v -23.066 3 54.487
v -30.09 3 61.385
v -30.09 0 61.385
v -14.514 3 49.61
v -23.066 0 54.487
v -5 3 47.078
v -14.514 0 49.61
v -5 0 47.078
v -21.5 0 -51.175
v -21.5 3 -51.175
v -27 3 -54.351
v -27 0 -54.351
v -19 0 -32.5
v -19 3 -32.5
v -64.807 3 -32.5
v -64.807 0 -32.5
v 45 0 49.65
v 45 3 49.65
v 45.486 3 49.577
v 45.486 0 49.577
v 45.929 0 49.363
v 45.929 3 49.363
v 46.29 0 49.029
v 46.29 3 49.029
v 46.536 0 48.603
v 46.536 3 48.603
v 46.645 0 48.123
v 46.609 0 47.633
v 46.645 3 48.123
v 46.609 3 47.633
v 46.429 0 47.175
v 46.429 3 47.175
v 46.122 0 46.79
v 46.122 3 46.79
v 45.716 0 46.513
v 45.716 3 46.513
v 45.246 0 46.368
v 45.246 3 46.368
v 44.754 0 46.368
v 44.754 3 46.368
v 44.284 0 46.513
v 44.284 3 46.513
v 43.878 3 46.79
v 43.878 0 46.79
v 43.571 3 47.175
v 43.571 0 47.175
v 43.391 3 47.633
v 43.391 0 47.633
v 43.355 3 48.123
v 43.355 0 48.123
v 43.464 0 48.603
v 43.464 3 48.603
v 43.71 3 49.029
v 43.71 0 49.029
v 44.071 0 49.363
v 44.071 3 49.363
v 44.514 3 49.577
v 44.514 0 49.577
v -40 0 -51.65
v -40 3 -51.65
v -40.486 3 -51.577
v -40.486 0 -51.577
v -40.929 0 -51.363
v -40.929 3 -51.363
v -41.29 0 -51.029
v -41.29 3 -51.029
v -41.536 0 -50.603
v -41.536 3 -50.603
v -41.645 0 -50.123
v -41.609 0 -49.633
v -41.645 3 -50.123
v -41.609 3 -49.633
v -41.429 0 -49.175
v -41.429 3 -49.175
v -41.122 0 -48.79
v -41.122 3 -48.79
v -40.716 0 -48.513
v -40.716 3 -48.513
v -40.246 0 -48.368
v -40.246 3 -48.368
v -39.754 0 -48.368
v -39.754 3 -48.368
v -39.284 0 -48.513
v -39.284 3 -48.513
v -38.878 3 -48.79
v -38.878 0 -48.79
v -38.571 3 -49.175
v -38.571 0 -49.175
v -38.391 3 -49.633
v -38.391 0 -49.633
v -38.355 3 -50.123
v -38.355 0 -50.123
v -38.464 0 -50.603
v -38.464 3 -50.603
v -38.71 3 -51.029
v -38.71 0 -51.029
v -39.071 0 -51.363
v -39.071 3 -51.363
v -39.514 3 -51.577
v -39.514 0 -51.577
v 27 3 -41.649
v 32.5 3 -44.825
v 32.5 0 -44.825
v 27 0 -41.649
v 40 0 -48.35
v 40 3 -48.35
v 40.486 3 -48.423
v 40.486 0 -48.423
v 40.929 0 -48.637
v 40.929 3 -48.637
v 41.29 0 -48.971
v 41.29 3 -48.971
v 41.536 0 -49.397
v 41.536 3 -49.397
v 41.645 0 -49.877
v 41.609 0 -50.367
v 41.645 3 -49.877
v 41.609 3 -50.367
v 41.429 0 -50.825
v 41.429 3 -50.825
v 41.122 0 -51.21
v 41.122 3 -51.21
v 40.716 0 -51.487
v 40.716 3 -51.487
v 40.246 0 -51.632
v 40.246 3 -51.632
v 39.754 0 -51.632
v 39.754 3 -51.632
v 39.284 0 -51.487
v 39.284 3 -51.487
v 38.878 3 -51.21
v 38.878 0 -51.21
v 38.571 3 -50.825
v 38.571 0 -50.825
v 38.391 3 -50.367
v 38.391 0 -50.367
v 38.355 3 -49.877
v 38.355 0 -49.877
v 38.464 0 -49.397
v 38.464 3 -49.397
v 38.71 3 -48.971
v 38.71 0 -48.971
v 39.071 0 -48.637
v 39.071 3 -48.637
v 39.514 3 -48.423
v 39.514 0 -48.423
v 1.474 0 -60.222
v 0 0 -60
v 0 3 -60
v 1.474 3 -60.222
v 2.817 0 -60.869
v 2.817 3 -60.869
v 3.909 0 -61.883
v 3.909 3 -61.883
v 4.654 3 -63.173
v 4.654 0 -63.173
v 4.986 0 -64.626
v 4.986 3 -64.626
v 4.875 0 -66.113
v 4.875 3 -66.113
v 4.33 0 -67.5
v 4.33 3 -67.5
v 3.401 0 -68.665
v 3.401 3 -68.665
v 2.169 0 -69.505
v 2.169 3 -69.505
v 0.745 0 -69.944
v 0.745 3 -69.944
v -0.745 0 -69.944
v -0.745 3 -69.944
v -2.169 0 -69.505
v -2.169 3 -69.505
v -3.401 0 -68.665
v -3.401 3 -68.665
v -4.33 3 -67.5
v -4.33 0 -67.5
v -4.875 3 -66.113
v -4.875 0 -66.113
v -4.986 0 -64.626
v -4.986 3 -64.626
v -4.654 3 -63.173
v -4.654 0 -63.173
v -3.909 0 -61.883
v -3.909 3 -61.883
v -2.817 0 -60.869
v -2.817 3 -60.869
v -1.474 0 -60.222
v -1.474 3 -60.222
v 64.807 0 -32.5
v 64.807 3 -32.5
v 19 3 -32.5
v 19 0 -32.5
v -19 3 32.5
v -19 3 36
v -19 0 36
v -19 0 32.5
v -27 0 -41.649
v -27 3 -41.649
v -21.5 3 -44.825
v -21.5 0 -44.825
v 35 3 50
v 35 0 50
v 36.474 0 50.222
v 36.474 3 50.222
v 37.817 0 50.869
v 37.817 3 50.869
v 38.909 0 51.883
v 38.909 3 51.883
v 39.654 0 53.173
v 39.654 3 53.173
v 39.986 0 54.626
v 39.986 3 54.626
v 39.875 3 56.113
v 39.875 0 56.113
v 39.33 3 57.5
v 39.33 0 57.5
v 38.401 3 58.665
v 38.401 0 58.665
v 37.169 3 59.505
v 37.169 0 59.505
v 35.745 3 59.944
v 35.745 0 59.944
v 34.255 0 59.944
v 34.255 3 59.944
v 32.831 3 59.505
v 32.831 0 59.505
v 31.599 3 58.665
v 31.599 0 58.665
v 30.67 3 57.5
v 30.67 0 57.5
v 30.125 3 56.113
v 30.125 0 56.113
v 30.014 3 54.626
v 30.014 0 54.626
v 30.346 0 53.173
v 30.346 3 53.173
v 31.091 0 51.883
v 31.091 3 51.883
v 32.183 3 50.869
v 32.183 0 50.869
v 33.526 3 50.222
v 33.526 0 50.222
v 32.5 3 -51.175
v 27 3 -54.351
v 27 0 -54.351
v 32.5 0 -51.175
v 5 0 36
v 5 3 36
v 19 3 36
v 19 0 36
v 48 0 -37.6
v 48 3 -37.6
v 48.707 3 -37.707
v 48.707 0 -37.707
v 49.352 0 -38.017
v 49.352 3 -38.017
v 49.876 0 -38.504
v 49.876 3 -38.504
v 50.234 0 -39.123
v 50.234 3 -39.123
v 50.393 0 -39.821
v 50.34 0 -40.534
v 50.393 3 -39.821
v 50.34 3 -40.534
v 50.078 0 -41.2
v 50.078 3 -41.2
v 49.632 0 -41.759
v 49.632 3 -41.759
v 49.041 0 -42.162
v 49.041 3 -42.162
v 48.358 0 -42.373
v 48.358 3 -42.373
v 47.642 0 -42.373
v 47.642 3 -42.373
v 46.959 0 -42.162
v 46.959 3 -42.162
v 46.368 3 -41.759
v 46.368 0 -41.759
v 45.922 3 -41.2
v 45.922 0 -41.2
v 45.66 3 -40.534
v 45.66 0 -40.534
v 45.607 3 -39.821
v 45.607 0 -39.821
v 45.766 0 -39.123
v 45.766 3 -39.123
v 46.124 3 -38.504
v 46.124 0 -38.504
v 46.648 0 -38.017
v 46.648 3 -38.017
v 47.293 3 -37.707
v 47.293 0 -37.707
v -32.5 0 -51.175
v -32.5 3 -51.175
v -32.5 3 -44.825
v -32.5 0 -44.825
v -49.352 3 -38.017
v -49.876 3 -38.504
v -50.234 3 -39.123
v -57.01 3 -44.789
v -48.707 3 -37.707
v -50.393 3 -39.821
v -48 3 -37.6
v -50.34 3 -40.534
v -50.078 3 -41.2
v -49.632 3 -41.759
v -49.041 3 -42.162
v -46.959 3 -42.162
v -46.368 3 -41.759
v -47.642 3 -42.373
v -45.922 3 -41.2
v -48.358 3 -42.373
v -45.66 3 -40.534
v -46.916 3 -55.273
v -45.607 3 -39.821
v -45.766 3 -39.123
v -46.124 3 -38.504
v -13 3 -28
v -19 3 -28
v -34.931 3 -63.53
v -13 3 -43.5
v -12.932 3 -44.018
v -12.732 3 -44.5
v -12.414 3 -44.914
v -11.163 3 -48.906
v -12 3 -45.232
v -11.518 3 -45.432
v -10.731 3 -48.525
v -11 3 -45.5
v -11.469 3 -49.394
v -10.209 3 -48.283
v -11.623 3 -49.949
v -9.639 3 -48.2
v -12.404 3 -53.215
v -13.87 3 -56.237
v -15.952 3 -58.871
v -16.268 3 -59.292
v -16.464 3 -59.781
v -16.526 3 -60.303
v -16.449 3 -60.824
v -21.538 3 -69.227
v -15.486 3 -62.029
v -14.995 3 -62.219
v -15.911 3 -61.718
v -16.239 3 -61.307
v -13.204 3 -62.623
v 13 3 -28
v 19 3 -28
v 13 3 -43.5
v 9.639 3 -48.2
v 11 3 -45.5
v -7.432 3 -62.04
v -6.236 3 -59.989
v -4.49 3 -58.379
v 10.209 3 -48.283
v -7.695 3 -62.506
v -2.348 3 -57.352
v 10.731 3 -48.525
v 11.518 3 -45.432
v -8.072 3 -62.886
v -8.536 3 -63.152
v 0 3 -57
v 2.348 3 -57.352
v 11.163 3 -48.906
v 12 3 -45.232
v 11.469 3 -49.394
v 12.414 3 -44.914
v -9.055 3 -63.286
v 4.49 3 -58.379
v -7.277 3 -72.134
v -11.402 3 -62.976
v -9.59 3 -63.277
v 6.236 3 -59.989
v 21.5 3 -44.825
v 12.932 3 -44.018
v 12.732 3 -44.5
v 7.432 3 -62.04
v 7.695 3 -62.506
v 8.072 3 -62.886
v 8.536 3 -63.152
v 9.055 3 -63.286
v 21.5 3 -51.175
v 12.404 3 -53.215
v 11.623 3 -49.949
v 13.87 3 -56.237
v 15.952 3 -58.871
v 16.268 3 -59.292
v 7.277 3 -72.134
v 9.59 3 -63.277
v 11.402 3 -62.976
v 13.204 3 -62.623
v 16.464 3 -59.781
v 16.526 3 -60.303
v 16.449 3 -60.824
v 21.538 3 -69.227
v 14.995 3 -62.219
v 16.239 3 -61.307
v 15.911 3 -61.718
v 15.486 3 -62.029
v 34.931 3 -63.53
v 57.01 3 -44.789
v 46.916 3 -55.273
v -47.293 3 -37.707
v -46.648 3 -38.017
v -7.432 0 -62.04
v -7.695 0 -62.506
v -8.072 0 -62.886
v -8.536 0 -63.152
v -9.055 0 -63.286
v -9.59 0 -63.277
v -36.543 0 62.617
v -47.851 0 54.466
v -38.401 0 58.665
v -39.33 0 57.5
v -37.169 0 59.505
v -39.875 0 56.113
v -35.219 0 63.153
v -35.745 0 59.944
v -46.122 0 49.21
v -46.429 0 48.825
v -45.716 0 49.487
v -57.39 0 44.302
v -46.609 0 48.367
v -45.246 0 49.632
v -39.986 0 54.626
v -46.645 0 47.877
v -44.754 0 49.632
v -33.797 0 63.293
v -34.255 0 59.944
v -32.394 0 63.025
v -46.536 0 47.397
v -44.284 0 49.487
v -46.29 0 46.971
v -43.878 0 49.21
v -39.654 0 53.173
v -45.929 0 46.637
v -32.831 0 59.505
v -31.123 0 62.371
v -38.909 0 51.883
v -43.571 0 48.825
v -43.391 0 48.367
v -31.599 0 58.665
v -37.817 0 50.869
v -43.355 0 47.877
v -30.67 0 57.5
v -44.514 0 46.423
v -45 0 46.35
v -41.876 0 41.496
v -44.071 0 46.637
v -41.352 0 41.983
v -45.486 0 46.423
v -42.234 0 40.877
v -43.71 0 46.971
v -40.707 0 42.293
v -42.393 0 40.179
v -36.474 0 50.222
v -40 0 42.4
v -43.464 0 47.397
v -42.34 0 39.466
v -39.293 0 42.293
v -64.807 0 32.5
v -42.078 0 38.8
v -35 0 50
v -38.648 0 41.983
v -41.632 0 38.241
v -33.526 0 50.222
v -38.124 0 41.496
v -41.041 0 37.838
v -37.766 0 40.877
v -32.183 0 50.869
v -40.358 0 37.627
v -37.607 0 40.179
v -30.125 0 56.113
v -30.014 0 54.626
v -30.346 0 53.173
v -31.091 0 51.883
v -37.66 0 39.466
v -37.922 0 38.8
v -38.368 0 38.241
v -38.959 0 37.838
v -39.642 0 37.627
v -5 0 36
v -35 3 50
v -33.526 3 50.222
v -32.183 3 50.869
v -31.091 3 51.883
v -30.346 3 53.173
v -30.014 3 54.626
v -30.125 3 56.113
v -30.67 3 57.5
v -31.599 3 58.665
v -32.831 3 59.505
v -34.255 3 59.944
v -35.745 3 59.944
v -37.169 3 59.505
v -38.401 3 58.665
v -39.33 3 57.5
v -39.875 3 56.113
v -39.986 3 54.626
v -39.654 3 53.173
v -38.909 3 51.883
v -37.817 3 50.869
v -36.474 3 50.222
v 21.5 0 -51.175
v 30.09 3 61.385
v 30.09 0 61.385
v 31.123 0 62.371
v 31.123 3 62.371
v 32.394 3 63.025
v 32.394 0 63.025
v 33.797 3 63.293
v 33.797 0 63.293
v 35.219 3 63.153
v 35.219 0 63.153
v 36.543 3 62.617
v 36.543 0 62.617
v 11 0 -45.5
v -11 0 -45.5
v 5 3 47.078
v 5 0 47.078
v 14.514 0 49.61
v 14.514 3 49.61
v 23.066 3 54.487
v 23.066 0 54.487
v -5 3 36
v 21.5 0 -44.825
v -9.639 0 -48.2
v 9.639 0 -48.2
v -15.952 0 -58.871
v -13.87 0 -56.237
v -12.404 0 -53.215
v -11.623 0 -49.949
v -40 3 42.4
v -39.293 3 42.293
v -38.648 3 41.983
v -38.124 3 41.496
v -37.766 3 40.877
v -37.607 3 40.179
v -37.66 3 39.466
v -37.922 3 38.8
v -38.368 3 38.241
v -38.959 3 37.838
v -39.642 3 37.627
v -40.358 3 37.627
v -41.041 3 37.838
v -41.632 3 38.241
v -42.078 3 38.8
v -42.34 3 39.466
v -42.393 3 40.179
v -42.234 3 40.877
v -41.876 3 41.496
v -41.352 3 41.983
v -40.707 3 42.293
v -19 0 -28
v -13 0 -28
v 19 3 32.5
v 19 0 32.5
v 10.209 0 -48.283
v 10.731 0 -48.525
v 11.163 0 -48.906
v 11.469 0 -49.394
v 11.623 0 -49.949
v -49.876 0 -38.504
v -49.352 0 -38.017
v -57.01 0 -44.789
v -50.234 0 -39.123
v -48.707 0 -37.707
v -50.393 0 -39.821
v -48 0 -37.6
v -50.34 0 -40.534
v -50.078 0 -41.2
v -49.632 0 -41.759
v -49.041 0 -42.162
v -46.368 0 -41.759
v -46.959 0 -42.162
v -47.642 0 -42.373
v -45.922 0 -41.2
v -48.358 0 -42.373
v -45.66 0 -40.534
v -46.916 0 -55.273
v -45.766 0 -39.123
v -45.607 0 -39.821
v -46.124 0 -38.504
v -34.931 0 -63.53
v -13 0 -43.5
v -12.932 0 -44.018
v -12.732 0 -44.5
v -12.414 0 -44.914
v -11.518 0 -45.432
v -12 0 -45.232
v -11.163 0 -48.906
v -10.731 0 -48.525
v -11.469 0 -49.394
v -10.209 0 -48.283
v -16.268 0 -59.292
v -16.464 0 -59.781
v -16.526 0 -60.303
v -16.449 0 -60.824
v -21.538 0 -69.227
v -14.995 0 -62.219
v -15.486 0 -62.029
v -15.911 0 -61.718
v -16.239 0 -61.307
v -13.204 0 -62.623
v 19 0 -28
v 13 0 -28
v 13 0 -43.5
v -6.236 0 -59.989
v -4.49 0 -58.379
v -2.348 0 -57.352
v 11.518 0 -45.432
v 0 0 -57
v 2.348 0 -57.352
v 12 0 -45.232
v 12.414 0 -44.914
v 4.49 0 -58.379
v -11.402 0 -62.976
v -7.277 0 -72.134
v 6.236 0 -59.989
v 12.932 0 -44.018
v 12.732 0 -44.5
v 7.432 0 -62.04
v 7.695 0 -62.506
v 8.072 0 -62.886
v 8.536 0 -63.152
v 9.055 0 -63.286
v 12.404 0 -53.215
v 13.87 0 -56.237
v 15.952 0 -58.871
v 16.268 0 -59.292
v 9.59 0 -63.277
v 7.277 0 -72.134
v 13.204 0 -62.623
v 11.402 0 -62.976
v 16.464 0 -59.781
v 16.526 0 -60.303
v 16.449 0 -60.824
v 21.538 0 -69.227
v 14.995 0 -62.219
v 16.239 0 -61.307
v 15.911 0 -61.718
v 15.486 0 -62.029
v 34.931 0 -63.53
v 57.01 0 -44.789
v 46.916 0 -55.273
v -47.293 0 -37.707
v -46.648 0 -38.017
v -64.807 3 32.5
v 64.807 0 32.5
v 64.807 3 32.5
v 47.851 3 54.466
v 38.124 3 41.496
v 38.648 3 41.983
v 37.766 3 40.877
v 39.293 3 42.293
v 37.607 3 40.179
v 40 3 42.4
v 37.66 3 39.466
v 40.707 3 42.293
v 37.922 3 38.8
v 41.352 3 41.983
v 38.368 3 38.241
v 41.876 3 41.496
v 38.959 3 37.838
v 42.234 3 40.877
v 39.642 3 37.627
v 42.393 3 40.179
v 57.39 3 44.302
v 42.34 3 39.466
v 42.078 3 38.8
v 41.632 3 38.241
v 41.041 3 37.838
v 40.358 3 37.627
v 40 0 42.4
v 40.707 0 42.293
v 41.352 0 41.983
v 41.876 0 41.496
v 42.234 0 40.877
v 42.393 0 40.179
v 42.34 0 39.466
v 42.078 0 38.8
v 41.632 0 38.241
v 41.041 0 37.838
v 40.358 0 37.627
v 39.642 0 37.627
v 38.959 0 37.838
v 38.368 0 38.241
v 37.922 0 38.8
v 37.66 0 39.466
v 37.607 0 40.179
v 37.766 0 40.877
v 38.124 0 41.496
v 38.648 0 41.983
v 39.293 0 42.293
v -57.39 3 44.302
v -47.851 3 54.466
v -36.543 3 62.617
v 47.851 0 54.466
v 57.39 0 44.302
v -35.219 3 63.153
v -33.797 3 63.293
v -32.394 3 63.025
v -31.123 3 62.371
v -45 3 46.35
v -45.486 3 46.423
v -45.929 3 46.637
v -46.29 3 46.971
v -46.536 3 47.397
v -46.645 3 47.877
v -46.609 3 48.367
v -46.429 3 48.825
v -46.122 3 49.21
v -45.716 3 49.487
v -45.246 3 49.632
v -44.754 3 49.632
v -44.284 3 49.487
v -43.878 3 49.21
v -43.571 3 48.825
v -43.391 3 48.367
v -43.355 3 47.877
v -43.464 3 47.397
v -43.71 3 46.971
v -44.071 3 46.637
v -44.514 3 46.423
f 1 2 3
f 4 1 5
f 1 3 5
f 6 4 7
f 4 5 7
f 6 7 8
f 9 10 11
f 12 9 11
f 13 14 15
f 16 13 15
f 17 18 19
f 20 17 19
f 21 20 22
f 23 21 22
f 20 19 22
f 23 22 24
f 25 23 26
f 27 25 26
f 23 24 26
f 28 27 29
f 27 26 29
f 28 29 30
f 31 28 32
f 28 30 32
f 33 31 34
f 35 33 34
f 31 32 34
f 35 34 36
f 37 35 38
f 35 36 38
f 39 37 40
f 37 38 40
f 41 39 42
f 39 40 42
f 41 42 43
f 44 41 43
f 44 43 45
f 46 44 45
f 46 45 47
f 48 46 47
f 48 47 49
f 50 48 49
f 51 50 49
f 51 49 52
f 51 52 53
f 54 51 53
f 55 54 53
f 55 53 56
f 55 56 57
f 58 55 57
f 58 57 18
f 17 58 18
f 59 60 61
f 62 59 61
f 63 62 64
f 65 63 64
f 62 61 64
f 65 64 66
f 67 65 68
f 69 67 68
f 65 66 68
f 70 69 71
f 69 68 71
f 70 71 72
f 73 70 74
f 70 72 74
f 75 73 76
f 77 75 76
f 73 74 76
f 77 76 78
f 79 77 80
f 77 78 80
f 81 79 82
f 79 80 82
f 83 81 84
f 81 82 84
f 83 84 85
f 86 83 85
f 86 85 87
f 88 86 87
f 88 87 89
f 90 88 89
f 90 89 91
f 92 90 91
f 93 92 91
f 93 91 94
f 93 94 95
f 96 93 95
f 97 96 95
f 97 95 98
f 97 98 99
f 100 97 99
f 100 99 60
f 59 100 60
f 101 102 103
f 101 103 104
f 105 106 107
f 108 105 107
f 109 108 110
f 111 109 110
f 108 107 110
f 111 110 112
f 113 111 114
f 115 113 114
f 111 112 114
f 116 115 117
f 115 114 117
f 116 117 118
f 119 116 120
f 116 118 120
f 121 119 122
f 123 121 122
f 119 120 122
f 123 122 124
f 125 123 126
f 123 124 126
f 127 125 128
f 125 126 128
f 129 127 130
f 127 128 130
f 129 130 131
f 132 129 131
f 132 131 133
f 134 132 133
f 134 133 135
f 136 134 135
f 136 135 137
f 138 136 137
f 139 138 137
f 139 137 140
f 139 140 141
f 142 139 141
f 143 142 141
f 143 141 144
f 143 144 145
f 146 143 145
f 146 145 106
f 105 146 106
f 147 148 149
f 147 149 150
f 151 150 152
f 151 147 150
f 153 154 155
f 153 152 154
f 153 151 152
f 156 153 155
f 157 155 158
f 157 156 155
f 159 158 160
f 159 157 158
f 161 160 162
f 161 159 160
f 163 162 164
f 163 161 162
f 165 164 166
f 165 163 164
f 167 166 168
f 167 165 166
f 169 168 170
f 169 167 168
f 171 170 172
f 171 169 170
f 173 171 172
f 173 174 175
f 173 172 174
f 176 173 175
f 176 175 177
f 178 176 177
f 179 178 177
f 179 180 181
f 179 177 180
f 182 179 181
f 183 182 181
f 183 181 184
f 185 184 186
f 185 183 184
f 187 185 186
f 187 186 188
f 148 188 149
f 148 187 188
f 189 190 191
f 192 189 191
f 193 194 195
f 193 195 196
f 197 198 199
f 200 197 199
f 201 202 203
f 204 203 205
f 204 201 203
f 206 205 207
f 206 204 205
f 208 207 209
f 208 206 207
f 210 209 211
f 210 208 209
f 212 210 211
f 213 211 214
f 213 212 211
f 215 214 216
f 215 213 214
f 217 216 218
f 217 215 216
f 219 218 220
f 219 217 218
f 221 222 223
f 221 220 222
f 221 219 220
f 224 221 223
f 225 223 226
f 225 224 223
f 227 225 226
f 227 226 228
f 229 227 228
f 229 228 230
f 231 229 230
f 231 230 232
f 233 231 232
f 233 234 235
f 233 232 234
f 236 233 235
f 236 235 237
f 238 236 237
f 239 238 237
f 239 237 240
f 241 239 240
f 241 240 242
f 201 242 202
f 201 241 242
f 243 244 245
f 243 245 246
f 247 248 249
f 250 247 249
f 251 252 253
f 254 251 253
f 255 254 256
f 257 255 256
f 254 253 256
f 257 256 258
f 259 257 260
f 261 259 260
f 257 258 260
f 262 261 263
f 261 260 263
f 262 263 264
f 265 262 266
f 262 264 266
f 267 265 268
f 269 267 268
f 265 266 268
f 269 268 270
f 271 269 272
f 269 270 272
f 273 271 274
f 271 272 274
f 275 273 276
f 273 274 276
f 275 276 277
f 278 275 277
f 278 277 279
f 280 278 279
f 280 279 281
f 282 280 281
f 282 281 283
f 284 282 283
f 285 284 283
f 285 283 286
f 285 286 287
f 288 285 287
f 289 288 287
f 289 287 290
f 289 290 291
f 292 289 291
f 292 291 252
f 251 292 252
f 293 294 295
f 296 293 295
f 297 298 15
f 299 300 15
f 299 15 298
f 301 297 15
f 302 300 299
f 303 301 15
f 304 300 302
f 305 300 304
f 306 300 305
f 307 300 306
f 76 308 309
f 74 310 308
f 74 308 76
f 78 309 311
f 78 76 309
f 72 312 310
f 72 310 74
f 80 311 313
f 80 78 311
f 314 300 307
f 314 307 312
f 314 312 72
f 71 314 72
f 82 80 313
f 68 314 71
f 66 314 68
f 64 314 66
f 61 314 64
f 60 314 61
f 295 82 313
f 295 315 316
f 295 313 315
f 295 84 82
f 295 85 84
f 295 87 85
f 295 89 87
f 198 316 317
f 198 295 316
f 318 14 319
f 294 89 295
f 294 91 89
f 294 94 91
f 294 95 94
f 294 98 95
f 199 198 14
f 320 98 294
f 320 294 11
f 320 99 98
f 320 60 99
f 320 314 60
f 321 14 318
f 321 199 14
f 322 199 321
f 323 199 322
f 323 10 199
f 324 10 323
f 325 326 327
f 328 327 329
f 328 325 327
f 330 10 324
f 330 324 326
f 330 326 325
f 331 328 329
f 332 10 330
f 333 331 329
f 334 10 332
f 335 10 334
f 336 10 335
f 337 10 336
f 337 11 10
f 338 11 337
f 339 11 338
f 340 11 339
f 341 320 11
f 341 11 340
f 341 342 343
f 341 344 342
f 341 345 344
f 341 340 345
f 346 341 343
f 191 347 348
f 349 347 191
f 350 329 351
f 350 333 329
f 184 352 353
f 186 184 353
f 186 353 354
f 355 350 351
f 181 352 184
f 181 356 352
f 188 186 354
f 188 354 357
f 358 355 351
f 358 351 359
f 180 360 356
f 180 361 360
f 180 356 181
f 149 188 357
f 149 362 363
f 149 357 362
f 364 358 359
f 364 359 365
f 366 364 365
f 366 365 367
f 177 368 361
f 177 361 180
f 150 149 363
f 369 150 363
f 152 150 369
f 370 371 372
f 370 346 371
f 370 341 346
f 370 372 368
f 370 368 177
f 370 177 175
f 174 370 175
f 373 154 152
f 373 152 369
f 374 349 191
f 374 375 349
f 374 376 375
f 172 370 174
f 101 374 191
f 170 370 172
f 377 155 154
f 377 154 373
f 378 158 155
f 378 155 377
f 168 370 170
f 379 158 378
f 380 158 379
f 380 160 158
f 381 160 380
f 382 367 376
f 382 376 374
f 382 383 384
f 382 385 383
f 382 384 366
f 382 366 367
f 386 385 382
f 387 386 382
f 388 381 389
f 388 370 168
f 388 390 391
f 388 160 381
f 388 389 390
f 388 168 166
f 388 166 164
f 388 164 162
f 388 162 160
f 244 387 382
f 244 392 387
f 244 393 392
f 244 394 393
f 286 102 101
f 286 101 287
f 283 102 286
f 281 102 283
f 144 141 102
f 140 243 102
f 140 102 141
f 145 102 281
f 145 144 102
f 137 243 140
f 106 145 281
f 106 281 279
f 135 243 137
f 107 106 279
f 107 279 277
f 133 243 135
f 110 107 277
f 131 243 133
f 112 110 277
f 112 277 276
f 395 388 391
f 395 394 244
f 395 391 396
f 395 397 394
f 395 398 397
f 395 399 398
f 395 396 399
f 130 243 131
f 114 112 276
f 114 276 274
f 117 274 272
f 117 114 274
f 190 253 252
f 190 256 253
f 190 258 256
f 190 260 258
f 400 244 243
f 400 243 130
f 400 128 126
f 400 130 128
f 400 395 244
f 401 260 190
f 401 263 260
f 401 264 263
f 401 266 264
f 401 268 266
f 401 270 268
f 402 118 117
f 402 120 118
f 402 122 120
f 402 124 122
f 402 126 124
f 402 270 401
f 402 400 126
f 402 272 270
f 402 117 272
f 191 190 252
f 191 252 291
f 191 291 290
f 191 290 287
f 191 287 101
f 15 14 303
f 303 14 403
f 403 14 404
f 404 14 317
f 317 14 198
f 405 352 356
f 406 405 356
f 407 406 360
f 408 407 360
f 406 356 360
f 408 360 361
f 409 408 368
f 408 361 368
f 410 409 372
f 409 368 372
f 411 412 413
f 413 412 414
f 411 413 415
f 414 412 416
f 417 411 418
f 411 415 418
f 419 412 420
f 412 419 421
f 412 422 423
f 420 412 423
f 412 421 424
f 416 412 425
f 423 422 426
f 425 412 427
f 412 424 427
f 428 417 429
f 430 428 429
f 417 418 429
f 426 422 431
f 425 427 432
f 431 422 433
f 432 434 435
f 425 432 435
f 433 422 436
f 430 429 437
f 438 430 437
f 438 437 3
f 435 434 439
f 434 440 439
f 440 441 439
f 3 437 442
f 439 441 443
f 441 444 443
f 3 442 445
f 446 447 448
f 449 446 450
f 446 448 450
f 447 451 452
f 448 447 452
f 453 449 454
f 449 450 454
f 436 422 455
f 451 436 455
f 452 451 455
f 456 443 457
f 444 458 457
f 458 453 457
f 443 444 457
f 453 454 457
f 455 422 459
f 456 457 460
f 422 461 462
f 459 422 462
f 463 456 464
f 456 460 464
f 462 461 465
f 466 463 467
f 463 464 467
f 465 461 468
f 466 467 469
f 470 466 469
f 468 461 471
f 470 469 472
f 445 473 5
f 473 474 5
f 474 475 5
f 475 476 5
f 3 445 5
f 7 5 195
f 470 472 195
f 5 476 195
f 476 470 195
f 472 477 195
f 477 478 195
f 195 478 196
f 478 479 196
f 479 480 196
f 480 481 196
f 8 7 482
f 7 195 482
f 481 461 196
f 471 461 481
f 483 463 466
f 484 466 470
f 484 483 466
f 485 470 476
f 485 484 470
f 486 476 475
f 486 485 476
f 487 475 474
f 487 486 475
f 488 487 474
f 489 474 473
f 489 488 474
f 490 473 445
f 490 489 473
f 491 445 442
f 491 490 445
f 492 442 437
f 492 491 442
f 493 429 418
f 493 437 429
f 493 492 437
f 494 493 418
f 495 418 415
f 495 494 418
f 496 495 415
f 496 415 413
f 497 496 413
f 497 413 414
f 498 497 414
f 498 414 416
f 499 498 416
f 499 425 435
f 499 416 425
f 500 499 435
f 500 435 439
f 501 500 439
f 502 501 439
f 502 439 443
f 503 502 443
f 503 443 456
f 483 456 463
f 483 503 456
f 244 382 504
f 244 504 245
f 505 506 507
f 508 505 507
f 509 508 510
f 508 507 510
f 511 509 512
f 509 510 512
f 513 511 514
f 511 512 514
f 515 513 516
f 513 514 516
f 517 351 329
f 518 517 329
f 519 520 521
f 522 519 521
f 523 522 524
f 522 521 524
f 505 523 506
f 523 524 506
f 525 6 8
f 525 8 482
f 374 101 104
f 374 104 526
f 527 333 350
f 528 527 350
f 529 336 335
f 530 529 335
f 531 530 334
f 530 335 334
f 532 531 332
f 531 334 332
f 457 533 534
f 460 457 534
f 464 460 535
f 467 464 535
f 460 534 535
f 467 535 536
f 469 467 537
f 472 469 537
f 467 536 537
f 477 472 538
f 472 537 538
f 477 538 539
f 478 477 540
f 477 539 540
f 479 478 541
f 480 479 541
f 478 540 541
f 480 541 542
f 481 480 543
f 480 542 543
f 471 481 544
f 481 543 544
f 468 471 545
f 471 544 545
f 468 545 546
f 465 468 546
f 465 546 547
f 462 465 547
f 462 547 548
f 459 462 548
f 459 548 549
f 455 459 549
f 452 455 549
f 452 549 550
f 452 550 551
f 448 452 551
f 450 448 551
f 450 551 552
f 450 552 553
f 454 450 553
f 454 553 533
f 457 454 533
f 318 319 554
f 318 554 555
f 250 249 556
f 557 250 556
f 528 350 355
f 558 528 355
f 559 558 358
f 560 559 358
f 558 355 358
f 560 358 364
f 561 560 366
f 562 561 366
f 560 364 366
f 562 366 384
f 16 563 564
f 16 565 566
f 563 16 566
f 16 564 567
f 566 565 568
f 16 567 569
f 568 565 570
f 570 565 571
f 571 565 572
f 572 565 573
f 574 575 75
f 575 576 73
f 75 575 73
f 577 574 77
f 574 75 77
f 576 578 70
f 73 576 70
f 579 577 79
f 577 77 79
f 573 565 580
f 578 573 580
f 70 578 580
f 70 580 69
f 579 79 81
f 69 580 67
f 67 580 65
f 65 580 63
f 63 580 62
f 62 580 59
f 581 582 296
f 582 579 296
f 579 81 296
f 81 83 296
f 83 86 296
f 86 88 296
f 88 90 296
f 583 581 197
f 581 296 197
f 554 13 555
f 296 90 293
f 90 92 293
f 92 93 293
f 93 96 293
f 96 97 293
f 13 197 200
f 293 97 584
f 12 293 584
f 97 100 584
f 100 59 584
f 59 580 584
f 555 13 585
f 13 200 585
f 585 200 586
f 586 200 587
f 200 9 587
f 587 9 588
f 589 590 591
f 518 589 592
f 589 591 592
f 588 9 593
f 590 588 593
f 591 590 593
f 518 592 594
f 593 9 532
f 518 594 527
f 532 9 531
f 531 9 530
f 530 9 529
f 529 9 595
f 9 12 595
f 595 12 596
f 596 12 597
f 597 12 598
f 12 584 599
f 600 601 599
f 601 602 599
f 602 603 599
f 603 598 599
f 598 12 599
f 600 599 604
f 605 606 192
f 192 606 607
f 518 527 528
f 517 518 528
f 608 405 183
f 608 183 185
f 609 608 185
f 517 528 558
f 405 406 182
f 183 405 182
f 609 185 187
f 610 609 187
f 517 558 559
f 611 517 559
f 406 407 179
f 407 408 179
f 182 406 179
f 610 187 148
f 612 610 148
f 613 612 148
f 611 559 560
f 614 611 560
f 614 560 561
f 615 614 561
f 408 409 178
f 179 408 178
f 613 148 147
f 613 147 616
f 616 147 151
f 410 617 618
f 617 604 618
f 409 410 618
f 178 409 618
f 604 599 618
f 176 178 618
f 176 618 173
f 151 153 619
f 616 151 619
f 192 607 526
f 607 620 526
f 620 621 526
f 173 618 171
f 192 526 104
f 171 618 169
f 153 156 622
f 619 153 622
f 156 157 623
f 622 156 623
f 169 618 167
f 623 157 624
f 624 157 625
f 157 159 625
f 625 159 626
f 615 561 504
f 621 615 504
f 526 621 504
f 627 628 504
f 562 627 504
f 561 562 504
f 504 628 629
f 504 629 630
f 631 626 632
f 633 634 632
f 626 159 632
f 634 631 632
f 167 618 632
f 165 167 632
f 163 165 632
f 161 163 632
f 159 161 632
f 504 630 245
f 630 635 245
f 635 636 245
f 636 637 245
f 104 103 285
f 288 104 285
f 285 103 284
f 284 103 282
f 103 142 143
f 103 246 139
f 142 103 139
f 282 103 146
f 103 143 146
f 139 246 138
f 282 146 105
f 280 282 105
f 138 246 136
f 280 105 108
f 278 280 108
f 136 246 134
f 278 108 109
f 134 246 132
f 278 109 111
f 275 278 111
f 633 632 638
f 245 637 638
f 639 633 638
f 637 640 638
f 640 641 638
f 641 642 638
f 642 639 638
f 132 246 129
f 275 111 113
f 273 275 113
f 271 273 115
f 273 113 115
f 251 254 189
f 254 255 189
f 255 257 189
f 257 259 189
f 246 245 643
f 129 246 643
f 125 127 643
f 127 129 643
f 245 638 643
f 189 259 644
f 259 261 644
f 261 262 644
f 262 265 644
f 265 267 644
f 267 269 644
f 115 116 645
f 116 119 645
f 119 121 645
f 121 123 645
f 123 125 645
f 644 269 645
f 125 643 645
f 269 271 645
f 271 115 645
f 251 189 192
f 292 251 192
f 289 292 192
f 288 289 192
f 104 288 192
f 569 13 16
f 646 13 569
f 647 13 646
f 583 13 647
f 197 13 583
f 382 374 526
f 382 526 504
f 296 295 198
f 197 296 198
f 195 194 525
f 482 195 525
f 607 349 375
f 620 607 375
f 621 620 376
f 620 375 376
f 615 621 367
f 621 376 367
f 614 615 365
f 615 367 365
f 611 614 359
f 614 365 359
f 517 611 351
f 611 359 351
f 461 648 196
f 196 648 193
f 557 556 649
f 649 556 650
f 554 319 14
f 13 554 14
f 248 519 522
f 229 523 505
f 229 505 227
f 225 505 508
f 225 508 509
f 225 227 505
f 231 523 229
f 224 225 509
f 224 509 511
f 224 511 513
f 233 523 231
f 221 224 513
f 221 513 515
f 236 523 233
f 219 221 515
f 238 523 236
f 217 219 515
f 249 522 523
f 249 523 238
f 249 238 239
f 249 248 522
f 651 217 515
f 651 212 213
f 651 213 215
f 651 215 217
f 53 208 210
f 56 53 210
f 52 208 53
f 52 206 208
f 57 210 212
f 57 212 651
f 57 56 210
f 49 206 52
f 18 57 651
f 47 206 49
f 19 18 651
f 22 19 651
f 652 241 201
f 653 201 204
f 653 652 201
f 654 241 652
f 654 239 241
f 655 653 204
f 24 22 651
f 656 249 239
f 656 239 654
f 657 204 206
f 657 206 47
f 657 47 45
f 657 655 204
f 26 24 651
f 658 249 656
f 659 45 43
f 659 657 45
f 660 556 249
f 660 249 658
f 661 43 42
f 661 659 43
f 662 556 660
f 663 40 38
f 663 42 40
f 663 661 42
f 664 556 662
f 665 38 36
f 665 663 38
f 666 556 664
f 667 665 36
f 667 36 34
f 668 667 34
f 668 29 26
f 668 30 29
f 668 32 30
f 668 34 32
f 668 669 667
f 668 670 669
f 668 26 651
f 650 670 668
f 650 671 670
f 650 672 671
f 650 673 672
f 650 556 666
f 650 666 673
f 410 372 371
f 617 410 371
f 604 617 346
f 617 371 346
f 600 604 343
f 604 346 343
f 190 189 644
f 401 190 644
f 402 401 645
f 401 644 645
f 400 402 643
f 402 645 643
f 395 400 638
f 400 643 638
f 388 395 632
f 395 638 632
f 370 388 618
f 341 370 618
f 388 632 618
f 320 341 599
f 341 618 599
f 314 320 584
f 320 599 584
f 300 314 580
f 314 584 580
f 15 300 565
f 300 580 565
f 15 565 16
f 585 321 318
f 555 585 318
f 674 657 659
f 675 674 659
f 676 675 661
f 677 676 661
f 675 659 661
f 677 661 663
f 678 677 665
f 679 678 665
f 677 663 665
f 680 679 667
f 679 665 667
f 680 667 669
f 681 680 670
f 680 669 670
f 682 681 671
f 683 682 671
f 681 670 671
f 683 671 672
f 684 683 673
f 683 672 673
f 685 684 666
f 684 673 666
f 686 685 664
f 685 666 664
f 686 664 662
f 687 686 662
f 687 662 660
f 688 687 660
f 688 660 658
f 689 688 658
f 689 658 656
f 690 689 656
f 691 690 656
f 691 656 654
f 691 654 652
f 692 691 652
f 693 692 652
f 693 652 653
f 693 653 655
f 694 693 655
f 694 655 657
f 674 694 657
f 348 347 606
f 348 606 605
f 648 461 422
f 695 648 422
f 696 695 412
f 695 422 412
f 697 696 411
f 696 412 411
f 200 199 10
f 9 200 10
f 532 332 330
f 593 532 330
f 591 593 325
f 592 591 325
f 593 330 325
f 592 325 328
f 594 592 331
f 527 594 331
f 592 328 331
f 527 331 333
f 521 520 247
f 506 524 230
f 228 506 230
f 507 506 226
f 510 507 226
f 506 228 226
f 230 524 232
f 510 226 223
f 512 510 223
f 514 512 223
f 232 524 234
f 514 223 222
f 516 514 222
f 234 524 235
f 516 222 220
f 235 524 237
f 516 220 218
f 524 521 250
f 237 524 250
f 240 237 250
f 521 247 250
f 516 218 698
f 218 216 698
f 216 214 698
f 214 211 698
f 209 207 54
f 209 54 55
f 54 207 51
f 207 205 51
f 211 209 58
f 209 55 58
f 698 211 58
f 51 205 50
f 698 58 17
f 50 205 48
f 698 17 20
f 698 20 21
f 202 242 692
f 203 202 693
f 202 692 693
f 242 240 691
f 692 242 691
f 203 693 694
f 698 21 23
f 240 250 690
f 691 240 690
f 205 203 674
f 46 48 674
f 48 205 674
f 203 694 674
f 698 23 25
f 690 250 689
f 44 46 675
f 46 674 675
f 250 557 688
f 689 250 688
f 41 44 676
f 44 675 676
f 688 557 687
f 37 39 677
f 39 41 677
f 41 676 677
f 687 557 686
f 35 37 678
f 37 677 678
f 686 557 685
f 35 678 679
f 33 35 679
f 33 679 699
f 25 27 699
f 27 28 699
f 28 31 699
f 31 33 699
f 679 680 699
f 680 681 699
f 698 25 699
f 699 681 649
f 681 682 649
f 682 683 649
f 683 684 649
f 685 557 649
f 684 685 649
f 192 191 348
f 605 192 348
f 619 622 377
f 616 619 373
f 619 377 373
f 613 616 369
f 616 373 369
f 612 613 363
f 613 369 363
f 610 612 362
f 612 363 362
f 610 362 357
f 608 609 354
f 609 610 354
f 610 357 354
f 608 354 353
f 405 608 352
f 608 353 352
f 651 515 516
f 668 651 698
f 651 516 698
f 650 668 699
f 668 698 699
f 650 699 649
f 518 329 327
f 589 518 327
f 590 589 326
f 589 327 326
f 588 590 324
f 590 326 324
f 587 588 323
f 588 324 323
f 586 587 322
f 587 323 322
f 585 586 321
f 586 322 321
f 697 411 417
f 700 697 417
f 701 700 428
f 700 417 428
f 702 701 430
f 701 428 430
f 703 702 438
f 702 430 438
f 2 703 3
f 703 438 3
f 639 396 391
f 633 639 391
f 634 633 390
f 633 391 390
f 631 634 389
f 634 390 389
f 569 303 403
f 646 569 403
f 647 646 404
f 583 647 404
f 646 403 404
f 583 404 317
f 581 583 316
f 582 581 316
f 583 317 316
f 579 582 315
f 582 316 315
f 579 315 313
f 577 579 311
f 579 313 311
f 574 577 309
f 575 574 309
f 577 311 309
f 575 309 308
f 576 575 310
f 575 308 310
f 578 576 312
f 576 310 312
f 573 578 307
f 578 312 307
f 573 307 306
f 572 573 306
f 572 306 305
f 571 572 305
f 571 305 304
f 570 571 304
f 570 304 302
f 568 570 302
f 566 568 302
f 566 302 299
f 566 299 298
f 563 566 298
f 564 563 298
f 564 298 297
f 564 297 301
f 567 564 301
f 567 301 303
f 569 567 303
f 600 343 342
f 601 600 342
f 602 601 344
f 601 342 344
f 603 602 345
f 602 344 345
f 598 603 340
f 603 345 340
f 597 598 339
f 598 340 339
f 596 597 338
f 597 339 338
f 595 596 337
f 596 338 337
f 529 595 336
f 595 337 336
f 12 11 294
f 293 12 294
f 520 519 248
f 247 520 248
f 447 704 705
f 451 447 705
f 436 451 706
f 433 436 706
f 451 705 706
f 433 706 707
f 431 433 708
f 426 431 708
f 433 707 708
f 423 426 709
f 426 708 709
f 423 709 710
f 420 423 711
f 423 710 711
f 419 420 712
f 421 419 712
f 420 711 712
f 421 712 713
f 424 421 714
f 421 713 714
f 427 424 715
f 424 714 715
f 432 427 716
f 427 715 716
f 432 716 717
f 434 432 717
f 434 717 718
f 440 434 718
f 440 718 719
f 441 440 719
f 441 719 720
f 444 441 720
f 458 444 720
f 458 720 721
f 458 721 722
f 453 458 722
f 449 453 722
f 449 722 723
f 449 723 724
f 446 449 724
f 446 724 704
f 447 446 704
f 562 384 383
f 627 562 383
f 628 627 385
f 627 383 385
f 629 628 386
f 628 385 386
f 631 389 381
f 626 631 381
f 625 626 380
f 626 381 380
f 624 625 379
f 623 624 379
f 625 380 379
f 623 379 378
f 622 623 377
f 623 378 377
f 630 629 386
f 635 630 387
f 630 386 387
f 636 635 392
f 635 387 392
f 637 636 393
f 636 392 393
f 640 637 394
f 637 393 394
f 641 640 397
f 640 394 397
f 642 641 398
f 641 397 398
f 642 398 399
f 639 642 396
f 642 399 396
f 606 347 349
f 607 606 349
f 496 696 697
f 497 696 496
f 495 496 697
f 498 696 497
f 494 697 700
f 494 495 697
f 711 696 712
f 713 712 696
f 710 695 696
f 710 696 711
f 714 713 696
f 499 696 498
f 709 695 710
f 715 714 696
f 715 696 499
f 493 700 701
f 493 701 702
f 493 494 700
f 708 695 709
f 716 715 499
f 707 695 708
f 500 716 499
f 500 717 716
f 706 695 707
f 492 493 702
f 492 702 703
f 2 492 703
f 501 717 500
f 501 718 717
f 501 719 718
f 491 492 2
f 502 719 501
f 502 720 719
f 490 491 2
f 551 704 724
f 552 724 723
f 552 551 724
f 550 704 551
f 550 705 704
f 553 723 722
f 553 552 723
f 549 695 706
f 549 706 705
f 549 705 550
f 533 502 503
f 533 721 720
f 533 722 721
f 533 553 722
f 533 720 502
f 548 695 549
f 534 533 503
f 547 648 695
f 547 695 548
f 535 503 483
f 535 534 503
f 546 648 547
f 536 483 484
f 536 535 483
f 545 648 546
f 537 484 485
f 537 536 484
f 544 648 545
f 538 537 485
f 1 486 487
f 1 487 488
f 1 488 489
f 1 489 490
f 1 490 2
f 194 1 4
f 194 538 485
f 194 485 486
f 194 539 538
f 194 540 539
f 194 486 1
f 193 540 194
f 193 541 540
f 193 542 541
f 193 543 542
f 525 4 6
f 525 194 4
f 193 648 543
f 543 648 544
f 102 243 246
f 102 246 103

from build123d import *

# Parameters (mm, degrees)
BOSS_EXTRUDE1_DEPTH      = 3
SOLENOID_PLACEMENT_W     = 38
SOLENOID_PLACEMENT_H     = 64
CUT_EXTRUDE1_DEPTH       = 103.574363269
CUT_EXTRUDE4_DEPTH       = 103.574363269
CUT_EXTRUDE5_DEPTH       = 103.574363269
SKETCH6_R                = 2.4
CUT_EXTRUDE6_DEPTH       = 103.574363269
CUT_EXTRUDE3_DEPTH       = 103.574363269
SKETCH7_W                = 10
SKETCH7_H                = 50
CUT_EXTRUDE7_DEPTH       = 98.289516393
SKETCH9_R                = 5
CUT_EXTRUDE11_DEPTH      = 98.289516393
CUT_EXTRUDE12_DEPTH      = 98.289516393
CUT_EXTRUDE12_DEPTH_BACK = 98.289516393
SKETCH10_R               = 5
SKETCH11_R               = 1.65
CUT_EXTRUDE13_DEPTH      = 98.289516393
CUT_EXTRUDE14_DEPTH      = 98.289516393


with BuildPart() as part:
    # Sketch1 → Boss-Extrude1 (new body)
    with BuildSketch(Plane(origin=(0, 0, 0), x_dir=(1, 0, 0), z_dir=(0, 1, 0))):
        with BuildLine():
            ThreePointArc((36.543377003, -62.616544118), (0, 72.5), (-36.543377003, -62.616544118))
            ThreePointArc((-36.543377003, -62.616544118), (-33.085954668, -63.20954405), (-30.089832649, -61.38507948))
            ThreePointArc((-30.089832649, -61.38507948), (0, -46.75), (30.089832649, -61.38507948))
            ThreePointArc((30.089832649, -61.38507948), (33.085954668, -63.20954405), (36.543377003, -62.616544118))
        make_face()
    extrude(amount=BOSS_EXTRUDE1_DEPTH)

    # solenoid placement → Cut-Extrude1 (cut, through all)
    with BuildSketch(Plane(origin=(0, 3, 0), x_dir=(1, 0, 0), z_dir=(0, 1, 0))):
        with Locations((0, -4)):
            Rectangle(SOLENOID_PLACEMENT_W, SOLENOID_PLACEMENT_H)
    extrude(amount=-CUT_EXTRUDE1_DEPTH, mode=Mode.SUBTRACT)

    # Sketch4 → Cut-Extrude4 (cut, through all)
    with BuildSketch(Plane(origin=(0, 3, 0), x_dir=(1, 0, 0), z_dir=(0, 1, 0))):
        with BuildLine():
            Line((-13, 28), (13, 28))
            Line((13, 28), (13, 43.5))
            ThreePointArc((13, 43.5), (12.414213562, 44.914213562), (11, 45.5))
            Line((11, 45.5), (-11, 45.5))
            ThreePointArc((-11, 45.5), (-12.414213562, 44.914213562), (-13, 43.5))
            Line((-13, 43.5), (-13, 28))
        make_face()
    extrude(amount=-CUT_EXTRUDE4_DEPTH, mode=Mode.SUBTRACT)

    # Sketch5 → Cut-Extrude5 (cut, through all)
    with BuildSketch(Plane(origin=(0, 3, 0), x_dir=(1, 0, 0), z_dir=(0, 1, 0))):
        Polygon((-21.5, 51.175426481), (-27, 54.350852961), (-32.5, 51.175426481), (-32.5, 44.824573519), (-27, 41.649147039), (-21.5, 44.824573519), align=None)
        Polygon((21.5, 44.824573519), (21.5, 51.175426481), (27, 54.350852961), (32.5, 51.175426481), (32.5, 44.824573519), (27, 41.649147039), align=None)
    extrude(amount=-CUT_EXTRUDE5_DEPTH, mode=Mode.SUBTRACT)

    # Sketch6 → Cut-Extrude6 (cut, through all)
    with BuildSketch(Plane(origin=(0, 3, 0), x_dir=(1, 0, 0), z_dir=(0, 1, 0))):
        with Locations((40, -40)):
            Circle(SKETCH6_R)
        with Locations((-40, -40)):
            Circle(SKETCH6_R)
        with Locations((48, 40)):
            Circle(SKETCH6_R)
        with Locations((-48, 40)):
            Circle(SKETCH6_R)
    extrude(amount=-CUT_EXTRUDE6_DEPTH, mode=Mode.SUBTRACT)

    # Sketch3 → Cut-Extrude3 (cut, through all)
    with BuildSketch(Plane(origin=(0, 3, 0), x_dir=(1, 0, 0), z_dir=(0, 1, 0))):
        Polygon((-19, 28), (-19, 32.5), (-72.5, 32.5), (-72.5, -32.5), (72.5, -32.5), (72.5, 32.5), (19, 32.5), (19, 28), align=None)
    extrude(amount=-CUT_EXTRUDE3_DEPTH, mode=Mode.SUBTRACT)


with BuildPart() as cut_extrude3_piece_1:
    # of the separate pieces the step leaves, piece 1, a body of its own (cut_extrude3_pieces)
    add(part.part.solids().sort_by_distance((64.807406984, 0, -32.5))[0])

    # Sketch10 → Cut-Extrude12 (cut, two sides: drawn at the far end of the back side and taken through both)
    with BuildSketch(Plane(origin=(0, 3, 0), x_dir=(1, 0, 0), z_dir=(0, 1, 0)).offset(-CUT_EXTRUDE12_DEPTH_BACK)):
        with Locations((0, 65)):
            Circle(SKETCH10_R)
    extrude(amount=CUT_EXTRUDE12_DEPTH + CUT_EXTRUDE12_DEPTH_BACK, mode=Mode.SUBTRACT)


with BuildPart() as cut_extrude3_piece_2:
    # of the separate pieces the step leaves, piece 2, a body of its own (cut_extrude3_pieces)
    add(part.part.solids().sort_by_distance((-36.543377003, 0, 62.616544118))[0])

    # Sketch7 → Cut-Extrude7 (cut, through all)
    with BuildSketch(Plane(origin=(0, 3, 0), x_dir=(1, 0, 0), z_dir=(0, 1, 0))):
        with Locations((0, -25)):
            Rectangle(SKETCH7_W, SKETCH7_H)
    extrude(amount=-CUT_EXTRUDE7_DEPTH, mode=Mode.SUBTRACT)


with BuildPart() as cut_extrude7_piece_1:
    # of the separate pieces the step leaves, piece 1, a body of its own (cut_extrude7_pieces)
    add(cut_extrude3_piece_2.part.solids().sort_by_distance((-36.543377003, 0, 62.616544118))[0])


with BuildPart() as cut_extrude7_piece_2:
    # of the separate pieces the step leaves, piece 2, a body of its own (cut_extrude7_pieces)
    add(cut_extrude3_piece_2.part.solids().sort_by_distance((5, 0, 47.078205475))[0])


with BuildPart() as cut_extrude11_tool:
    # Sketch9 → Cut-Extrude11 (new, through all)
    with BuildSketch(Plane.XZ.offset(-3)):
        with Locations((35, 55)):
            Circle(SKETCH9_R)
        with Locations((-35, 55)):
            Circle(SKETCH9_R)
    extrude(amount=CUT_EXTRUDE11_DEPTH)


with BuildPart() as cut_extrude7_piece_1_1:
    add(cut_extrude7_piece_1.part)

    # Cut-Extrude11: cut by cut_extrude11_tool
    add(cut_extrude11_tool.part, mode=Mode.SUBTRACT)


with BuildPart() as cut_extrude7_piece_2_1:
    add(cut_extrude7_piece_2.part)

    # Cut-Extrude11: cut by cut_extrude11_tool
    add(cut_extrude11_tool.part, mode=Mode.SUBTRACT)


with BuildPart() as cut_extrude13_tool:
    # Sketch11 → Cut-Extrude13 (new, through all)
    with BuildSketch(Plane(origin=(0, 3, 0), x_dir=(1, 0, 0), z_dir=(0, 1, 0))):
        with Locations((45, -48)):
            Circle(SKETCH11_R)
        with Locations((-45, -48)):
            Circle(SKETCH11_R)
        with Locations((40, 50)):
            Circle(SKETCH11_R)
        with Locations((-40, 50)):
            Circle(SKETCH11_R)
    extrude(amount=-CUT_EXTRUDE13_DEPTH)


with BuildPart() as cut_extrude3_piece_1_1:
    add(cut_extrude3_piece_1.part)

    # Cut-Extrude13: cut by cut_extrude13_tool
    add(cut_extrude13_tool.part, mode=Mode.SUBTRACT)

    # Sketch13 → Cut-Extrude14 (cut, through all)
    with BuildSketch(Plane(origin=(0, 3, 0), x_dir=(1, 0, 0), z_dir=(0, 1, 0))):
        with BuildLine():
            ThreePointArc((-11.622969422, 49.948571429), (-10.961172041, 48.699523885), (-9.638836445, 48.2))
            Line((-9.638836445, 48.2), (9.638836445, 48.2))
            ThreePointArc((9.638836445, 48.2), (10.961172041, 48.699523885), (11.622969422, 49.948571429))
            ThreePointArc((11.622969422, 49.948571429), (13.054510917, 54.765599326), (15.951885484, 58.871484058))
            ThreePointArc((15.951885484, 58.871484058), (16.449270482, 60.8240474), (14.994913363, 62.21858704))
            ThreePointArc((14.994913363, 62.21858704), (12.303854546, 62.806171379), (9.590005203, 63.277419355))
            ThreePointArc((9.590005203, 63.277419355), (8.295362524, 63.03495375), (7.432254032, 62.04))
            ThreePointArc((7.432254032, 62.04), (0, 57), (-7.432254032, 62.04))
            ThreePointArc((-7.432254032, 62.04), (-8.295362524, 63.03495375), (-9.590005203, 63.277419355))
            ThreePointArc((-9.590005203, 63.277419355), (-12.303854546, 62.806171379), (-14.994913363, 62.21858704))
            ThreePointArc((-14.994913363, 62.21858704), (-16.449270482, 60.8240474), (-15.951885484, 58.871484058))
            ThreePointArc((-15.951885484, 58.871484058), (-13.054510917, 54.765599326), (-11.622969422, 49.948571429))
        make_face()
    extrude(amount=-CUT_EXTRUDE14_DEPTH, mode=Mode.SUBTRACT)


with BuildPart() as cut_extrude7_piece_1_2:
    add(cut_extrude7_piece_1_1.part)

    # Cut-Extrude13: cut by cut_extrude13_tool
    add(cut_extrude13_tool.part, mode=Mode.SUBTRACT)


with BuildPart() as cut_extrude7_piece_2_2:
    add(cut_extrude7_piece_2_1.part)

    # Cut-Extrude13: cut by cut_extrude13_tool
    add(cut_extrude13_tool.part, mode=Mode.SUBTRACT)


solid = Compound([cut_extrude3_piece_1_1.part, cut_extrude7_piece_1_2.part, cut_extrude7_piece_2_2.part])
